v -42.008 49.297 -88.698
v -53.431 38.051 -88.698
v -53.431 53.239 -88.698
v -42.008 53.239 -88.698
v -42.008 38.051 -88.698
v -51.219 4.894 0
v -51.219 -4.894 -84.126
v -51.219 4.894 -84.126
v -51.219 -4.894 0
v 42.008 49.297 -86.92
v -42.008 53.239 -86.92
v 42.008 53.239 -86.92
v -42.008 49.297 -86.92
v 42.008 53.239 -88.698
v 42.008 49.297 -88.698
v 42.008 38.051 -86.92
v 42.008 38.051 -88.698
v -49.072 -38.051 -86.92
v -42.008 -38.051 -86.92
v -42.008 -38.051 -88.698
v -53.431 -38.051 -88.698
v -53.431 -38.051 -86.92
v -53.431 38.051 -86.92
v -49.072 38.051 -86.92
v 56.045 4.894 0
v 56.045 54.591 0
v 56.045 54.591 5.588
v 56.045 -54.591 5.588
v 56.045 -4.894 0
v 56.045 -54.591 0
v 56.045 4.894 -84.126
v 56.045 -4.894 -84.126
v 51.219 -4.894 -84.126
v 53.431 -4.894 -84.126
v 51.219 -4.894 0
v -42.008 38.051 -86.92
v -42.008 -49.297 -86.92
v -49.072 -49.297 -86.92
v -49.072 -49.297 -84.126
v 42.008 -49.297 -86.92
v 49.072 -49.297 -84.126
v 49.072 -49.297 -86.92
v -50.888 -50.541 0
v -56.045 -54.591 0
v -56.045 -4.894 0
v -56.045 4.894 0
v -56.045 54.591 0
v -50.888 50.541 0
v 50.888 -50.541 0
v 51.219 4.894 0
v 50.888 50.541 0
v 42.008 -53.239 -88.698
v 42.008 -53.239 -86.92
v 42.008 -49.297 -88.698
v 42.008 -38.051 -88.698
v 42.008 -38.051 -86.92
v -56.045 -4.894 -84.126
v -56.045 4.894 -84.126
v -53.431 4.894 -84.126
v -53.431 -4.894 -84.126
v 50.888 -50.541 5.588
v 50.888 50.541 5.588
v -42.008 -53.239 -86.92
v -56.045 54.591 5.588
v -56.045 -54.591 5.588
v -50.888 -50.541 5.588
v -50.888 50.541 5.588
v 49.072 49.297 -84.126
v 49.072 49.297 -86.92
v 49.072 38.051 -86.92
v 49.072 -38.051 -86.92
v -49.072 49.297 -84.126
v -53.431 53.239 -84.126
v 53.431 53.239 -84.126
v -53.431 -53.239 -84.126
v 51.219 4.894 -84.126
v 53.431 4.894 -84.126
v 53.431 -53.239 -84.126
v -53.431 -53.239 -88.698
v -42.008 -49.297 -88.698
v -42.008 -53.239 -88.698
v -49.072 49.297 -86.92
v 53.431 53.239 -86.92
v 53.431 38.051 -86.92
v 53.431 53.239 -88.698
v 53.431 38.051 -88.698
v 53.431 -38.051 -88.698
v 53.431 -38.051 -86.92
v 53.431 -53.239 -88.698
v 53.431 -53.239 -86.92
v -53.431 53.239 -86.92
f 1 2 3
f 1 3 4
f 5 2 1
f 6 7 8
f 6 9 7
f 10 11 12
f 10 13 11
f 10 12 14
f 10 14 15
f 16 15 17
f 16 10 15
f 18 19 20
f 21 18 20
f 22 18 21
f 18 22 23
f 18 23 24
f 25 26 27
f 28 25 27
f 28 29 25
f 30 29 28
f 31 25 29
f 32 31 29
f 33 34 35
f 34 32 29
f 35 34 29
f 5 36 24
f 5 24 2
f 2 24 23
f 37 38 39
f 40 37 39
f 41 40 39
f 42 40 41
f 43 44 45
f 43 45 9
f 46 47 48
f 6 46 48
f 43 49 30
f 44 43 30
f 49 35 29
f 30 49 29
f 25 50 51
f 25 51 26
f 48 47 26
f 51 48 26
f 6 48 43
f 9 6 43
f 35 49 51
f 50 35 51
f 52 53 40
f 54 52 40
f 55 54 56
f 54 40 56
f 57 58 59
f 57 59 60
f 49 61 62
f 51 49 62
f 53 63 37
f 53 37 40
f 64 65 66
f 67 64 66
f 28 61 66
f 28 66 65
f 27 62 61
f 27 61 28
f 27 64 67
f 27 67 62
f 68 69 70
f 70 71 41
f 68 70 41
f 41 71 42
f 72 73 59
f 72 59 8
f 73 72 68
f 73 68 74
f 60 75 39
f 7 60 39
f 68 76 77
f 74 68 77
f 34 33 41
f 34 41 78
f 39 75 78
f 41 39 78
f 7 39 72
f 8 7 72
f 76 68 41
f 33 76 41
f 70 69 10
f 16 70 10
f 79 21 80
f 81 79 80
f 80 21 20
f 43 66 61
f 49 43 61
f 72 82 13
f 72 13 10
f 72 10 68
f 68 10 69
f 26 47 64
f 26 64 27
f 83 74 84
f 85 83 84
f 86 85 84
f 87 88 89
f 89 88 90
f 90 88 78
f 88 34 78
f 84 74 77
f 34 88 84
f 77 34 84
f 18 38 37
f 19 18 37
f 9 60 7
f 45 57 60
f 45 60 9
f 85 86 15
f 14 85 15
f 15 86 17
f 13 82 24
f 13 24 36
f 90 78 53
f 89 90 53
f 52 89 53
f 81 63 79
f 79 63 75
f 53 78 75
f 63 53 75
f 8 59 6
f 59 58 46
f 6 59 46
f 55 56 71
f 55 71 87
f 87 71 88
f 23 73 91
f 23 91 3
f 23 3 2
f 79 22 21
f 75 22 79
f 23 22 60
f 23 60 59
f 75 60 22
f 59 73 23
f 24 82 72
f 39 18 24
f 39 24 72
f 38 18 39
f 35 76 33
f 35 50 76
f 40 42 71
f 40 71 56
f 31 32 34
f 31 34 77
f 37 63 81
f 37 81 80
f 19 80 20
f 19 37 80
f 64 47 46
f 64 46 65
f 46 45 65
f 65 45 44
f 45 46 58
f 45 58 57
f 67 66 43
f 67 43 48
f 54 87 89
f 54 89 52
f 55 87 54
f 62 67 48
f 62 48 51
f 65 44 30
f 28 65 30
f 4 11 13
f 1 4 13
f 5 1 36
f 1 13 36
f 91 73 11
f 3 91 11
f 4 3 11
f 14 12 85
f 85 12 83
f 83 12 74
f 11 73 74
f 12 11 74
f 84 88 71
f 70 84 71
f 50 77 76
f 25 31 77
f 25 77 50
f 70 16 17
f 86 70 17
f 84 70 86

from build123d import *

# Parameters (mm, degrees)
F0_W      = 112.0901331306
F0_H      = 109.1817319393
F1_DEPTH  = 5.588
F2_W      = 101.775161922
F2_H      = 101.0821834207
F3_DEPTH  = 25.4
F4_W      = 4.89441026
F4_H      = 84.1260254383
F5_DEPTH  = 4.826
F7_W      = 106.8618372083
F7_H      = 106.4788401127
F8_DEPTH  = 2.794
F9_W      = 98.1444716454
F9_H      = 98.5935106874
F10_DEPTH = 25.4
F11_W     = 7.0638842881
F11_H     = 11.2456418574
F12_DEPTH = 1.778
F15_W     = 112.0901331306
F15_H     = 109.1817319393
F15_W_2   = 101.775161922
F15_H_2   = 101.0821834207
F16_DEPTH = 1.016


with BuildPart() as f1:
    # F0 (on Top) → F1 (new body)
    with BuildSketch(Plane.XY):
        Rectangle(F0_W, F0_H)
    extrude(amount=F1_DEPTH)

    # F2 (on face) → F3 (cut)
    with BuildSketch(Plane.XY.offset(5.588)):
        Rectangle(F2_W, F2_H)
    extrude(amount=-F3_DEPTH, mode=Mode.SUBTRACT)

    # F4 (on face) → F5 (join)
    with BuildSketch(Plane.YZ.offset(56.0450665653)):
        with Locations((2.44720513, -42.0630127192)):
            Rectangle(F4_W, F4_H)
    extrude(amount=-F5_DEPTH)

    # F6: F1 across plane


with BuildPart() as f1_1:
    add(f1.part)
    add(f1.part.mirror(Plane.YZ))

    # F7 (on face) → F8 (join)
    with BuildSketch(Plane(origin=(0, 0, -84.1260254383), x_dir=(1, 0, 0), z_dir=(0, 0, -1))):
        Rectangle(F7_W, F7_H)
    extrude(amount=F8_DEPTH)

    # F9 (on face) → F10 (cut)
    with BuildSketch(Plane(origin=(0, 0, -86.9200254383), x_dir=(1, 0, 0), z_dir=(0, 0, -1))):
        Rectangle(F9_W, F9_H)
    extrude(amount=-F10_DEPTH, mode=Mode.SUBTRACT)

    # F11 (on face) → F12 (join)
    with BuildSketch(Plane(origin=(0, 0, -86.9200254383), x_dir=(1, 0, 0), z_dir=(0, 0, -1))):
        Polygon((-53.4309186041, -38.0511134863), (-53.4309186041, -53.2394200563), (-42.0083515346, -53.2394200563), (-42.0083515346, -49.2967553437), (-49.0722358227, -49.2967553437), (-49.0722358227, -38.0511134863), align=None)
        with Locations((-45.5402936786, -43.673934415)):
            Rectangle(F11_W, F11_H)
    extrude(amount=F12_DEPTH)

    # F13: F1 across plane


with BuildPart() as f1_2:
    add(f1_1.part)
    add(f1_1.part.mirror(Plane.XZ))

    # F14: F1 across plane


with BuildPart() as f1_3:
    add(f1_2.part)
    add(f1_2.part.mirror(Plane.YZ))

    # F15 (on face) → F16 (join)
    with BuildSketch(Plane.XY.offset(5.588)):
        Rectangle(F15_W, F15_H)
        Rectangle(F15_W_2, F15_H_2, mode=Mode.SUBTRACT)
    extrude(amount=-F16_DEPTH)


solid = f1_3.part
